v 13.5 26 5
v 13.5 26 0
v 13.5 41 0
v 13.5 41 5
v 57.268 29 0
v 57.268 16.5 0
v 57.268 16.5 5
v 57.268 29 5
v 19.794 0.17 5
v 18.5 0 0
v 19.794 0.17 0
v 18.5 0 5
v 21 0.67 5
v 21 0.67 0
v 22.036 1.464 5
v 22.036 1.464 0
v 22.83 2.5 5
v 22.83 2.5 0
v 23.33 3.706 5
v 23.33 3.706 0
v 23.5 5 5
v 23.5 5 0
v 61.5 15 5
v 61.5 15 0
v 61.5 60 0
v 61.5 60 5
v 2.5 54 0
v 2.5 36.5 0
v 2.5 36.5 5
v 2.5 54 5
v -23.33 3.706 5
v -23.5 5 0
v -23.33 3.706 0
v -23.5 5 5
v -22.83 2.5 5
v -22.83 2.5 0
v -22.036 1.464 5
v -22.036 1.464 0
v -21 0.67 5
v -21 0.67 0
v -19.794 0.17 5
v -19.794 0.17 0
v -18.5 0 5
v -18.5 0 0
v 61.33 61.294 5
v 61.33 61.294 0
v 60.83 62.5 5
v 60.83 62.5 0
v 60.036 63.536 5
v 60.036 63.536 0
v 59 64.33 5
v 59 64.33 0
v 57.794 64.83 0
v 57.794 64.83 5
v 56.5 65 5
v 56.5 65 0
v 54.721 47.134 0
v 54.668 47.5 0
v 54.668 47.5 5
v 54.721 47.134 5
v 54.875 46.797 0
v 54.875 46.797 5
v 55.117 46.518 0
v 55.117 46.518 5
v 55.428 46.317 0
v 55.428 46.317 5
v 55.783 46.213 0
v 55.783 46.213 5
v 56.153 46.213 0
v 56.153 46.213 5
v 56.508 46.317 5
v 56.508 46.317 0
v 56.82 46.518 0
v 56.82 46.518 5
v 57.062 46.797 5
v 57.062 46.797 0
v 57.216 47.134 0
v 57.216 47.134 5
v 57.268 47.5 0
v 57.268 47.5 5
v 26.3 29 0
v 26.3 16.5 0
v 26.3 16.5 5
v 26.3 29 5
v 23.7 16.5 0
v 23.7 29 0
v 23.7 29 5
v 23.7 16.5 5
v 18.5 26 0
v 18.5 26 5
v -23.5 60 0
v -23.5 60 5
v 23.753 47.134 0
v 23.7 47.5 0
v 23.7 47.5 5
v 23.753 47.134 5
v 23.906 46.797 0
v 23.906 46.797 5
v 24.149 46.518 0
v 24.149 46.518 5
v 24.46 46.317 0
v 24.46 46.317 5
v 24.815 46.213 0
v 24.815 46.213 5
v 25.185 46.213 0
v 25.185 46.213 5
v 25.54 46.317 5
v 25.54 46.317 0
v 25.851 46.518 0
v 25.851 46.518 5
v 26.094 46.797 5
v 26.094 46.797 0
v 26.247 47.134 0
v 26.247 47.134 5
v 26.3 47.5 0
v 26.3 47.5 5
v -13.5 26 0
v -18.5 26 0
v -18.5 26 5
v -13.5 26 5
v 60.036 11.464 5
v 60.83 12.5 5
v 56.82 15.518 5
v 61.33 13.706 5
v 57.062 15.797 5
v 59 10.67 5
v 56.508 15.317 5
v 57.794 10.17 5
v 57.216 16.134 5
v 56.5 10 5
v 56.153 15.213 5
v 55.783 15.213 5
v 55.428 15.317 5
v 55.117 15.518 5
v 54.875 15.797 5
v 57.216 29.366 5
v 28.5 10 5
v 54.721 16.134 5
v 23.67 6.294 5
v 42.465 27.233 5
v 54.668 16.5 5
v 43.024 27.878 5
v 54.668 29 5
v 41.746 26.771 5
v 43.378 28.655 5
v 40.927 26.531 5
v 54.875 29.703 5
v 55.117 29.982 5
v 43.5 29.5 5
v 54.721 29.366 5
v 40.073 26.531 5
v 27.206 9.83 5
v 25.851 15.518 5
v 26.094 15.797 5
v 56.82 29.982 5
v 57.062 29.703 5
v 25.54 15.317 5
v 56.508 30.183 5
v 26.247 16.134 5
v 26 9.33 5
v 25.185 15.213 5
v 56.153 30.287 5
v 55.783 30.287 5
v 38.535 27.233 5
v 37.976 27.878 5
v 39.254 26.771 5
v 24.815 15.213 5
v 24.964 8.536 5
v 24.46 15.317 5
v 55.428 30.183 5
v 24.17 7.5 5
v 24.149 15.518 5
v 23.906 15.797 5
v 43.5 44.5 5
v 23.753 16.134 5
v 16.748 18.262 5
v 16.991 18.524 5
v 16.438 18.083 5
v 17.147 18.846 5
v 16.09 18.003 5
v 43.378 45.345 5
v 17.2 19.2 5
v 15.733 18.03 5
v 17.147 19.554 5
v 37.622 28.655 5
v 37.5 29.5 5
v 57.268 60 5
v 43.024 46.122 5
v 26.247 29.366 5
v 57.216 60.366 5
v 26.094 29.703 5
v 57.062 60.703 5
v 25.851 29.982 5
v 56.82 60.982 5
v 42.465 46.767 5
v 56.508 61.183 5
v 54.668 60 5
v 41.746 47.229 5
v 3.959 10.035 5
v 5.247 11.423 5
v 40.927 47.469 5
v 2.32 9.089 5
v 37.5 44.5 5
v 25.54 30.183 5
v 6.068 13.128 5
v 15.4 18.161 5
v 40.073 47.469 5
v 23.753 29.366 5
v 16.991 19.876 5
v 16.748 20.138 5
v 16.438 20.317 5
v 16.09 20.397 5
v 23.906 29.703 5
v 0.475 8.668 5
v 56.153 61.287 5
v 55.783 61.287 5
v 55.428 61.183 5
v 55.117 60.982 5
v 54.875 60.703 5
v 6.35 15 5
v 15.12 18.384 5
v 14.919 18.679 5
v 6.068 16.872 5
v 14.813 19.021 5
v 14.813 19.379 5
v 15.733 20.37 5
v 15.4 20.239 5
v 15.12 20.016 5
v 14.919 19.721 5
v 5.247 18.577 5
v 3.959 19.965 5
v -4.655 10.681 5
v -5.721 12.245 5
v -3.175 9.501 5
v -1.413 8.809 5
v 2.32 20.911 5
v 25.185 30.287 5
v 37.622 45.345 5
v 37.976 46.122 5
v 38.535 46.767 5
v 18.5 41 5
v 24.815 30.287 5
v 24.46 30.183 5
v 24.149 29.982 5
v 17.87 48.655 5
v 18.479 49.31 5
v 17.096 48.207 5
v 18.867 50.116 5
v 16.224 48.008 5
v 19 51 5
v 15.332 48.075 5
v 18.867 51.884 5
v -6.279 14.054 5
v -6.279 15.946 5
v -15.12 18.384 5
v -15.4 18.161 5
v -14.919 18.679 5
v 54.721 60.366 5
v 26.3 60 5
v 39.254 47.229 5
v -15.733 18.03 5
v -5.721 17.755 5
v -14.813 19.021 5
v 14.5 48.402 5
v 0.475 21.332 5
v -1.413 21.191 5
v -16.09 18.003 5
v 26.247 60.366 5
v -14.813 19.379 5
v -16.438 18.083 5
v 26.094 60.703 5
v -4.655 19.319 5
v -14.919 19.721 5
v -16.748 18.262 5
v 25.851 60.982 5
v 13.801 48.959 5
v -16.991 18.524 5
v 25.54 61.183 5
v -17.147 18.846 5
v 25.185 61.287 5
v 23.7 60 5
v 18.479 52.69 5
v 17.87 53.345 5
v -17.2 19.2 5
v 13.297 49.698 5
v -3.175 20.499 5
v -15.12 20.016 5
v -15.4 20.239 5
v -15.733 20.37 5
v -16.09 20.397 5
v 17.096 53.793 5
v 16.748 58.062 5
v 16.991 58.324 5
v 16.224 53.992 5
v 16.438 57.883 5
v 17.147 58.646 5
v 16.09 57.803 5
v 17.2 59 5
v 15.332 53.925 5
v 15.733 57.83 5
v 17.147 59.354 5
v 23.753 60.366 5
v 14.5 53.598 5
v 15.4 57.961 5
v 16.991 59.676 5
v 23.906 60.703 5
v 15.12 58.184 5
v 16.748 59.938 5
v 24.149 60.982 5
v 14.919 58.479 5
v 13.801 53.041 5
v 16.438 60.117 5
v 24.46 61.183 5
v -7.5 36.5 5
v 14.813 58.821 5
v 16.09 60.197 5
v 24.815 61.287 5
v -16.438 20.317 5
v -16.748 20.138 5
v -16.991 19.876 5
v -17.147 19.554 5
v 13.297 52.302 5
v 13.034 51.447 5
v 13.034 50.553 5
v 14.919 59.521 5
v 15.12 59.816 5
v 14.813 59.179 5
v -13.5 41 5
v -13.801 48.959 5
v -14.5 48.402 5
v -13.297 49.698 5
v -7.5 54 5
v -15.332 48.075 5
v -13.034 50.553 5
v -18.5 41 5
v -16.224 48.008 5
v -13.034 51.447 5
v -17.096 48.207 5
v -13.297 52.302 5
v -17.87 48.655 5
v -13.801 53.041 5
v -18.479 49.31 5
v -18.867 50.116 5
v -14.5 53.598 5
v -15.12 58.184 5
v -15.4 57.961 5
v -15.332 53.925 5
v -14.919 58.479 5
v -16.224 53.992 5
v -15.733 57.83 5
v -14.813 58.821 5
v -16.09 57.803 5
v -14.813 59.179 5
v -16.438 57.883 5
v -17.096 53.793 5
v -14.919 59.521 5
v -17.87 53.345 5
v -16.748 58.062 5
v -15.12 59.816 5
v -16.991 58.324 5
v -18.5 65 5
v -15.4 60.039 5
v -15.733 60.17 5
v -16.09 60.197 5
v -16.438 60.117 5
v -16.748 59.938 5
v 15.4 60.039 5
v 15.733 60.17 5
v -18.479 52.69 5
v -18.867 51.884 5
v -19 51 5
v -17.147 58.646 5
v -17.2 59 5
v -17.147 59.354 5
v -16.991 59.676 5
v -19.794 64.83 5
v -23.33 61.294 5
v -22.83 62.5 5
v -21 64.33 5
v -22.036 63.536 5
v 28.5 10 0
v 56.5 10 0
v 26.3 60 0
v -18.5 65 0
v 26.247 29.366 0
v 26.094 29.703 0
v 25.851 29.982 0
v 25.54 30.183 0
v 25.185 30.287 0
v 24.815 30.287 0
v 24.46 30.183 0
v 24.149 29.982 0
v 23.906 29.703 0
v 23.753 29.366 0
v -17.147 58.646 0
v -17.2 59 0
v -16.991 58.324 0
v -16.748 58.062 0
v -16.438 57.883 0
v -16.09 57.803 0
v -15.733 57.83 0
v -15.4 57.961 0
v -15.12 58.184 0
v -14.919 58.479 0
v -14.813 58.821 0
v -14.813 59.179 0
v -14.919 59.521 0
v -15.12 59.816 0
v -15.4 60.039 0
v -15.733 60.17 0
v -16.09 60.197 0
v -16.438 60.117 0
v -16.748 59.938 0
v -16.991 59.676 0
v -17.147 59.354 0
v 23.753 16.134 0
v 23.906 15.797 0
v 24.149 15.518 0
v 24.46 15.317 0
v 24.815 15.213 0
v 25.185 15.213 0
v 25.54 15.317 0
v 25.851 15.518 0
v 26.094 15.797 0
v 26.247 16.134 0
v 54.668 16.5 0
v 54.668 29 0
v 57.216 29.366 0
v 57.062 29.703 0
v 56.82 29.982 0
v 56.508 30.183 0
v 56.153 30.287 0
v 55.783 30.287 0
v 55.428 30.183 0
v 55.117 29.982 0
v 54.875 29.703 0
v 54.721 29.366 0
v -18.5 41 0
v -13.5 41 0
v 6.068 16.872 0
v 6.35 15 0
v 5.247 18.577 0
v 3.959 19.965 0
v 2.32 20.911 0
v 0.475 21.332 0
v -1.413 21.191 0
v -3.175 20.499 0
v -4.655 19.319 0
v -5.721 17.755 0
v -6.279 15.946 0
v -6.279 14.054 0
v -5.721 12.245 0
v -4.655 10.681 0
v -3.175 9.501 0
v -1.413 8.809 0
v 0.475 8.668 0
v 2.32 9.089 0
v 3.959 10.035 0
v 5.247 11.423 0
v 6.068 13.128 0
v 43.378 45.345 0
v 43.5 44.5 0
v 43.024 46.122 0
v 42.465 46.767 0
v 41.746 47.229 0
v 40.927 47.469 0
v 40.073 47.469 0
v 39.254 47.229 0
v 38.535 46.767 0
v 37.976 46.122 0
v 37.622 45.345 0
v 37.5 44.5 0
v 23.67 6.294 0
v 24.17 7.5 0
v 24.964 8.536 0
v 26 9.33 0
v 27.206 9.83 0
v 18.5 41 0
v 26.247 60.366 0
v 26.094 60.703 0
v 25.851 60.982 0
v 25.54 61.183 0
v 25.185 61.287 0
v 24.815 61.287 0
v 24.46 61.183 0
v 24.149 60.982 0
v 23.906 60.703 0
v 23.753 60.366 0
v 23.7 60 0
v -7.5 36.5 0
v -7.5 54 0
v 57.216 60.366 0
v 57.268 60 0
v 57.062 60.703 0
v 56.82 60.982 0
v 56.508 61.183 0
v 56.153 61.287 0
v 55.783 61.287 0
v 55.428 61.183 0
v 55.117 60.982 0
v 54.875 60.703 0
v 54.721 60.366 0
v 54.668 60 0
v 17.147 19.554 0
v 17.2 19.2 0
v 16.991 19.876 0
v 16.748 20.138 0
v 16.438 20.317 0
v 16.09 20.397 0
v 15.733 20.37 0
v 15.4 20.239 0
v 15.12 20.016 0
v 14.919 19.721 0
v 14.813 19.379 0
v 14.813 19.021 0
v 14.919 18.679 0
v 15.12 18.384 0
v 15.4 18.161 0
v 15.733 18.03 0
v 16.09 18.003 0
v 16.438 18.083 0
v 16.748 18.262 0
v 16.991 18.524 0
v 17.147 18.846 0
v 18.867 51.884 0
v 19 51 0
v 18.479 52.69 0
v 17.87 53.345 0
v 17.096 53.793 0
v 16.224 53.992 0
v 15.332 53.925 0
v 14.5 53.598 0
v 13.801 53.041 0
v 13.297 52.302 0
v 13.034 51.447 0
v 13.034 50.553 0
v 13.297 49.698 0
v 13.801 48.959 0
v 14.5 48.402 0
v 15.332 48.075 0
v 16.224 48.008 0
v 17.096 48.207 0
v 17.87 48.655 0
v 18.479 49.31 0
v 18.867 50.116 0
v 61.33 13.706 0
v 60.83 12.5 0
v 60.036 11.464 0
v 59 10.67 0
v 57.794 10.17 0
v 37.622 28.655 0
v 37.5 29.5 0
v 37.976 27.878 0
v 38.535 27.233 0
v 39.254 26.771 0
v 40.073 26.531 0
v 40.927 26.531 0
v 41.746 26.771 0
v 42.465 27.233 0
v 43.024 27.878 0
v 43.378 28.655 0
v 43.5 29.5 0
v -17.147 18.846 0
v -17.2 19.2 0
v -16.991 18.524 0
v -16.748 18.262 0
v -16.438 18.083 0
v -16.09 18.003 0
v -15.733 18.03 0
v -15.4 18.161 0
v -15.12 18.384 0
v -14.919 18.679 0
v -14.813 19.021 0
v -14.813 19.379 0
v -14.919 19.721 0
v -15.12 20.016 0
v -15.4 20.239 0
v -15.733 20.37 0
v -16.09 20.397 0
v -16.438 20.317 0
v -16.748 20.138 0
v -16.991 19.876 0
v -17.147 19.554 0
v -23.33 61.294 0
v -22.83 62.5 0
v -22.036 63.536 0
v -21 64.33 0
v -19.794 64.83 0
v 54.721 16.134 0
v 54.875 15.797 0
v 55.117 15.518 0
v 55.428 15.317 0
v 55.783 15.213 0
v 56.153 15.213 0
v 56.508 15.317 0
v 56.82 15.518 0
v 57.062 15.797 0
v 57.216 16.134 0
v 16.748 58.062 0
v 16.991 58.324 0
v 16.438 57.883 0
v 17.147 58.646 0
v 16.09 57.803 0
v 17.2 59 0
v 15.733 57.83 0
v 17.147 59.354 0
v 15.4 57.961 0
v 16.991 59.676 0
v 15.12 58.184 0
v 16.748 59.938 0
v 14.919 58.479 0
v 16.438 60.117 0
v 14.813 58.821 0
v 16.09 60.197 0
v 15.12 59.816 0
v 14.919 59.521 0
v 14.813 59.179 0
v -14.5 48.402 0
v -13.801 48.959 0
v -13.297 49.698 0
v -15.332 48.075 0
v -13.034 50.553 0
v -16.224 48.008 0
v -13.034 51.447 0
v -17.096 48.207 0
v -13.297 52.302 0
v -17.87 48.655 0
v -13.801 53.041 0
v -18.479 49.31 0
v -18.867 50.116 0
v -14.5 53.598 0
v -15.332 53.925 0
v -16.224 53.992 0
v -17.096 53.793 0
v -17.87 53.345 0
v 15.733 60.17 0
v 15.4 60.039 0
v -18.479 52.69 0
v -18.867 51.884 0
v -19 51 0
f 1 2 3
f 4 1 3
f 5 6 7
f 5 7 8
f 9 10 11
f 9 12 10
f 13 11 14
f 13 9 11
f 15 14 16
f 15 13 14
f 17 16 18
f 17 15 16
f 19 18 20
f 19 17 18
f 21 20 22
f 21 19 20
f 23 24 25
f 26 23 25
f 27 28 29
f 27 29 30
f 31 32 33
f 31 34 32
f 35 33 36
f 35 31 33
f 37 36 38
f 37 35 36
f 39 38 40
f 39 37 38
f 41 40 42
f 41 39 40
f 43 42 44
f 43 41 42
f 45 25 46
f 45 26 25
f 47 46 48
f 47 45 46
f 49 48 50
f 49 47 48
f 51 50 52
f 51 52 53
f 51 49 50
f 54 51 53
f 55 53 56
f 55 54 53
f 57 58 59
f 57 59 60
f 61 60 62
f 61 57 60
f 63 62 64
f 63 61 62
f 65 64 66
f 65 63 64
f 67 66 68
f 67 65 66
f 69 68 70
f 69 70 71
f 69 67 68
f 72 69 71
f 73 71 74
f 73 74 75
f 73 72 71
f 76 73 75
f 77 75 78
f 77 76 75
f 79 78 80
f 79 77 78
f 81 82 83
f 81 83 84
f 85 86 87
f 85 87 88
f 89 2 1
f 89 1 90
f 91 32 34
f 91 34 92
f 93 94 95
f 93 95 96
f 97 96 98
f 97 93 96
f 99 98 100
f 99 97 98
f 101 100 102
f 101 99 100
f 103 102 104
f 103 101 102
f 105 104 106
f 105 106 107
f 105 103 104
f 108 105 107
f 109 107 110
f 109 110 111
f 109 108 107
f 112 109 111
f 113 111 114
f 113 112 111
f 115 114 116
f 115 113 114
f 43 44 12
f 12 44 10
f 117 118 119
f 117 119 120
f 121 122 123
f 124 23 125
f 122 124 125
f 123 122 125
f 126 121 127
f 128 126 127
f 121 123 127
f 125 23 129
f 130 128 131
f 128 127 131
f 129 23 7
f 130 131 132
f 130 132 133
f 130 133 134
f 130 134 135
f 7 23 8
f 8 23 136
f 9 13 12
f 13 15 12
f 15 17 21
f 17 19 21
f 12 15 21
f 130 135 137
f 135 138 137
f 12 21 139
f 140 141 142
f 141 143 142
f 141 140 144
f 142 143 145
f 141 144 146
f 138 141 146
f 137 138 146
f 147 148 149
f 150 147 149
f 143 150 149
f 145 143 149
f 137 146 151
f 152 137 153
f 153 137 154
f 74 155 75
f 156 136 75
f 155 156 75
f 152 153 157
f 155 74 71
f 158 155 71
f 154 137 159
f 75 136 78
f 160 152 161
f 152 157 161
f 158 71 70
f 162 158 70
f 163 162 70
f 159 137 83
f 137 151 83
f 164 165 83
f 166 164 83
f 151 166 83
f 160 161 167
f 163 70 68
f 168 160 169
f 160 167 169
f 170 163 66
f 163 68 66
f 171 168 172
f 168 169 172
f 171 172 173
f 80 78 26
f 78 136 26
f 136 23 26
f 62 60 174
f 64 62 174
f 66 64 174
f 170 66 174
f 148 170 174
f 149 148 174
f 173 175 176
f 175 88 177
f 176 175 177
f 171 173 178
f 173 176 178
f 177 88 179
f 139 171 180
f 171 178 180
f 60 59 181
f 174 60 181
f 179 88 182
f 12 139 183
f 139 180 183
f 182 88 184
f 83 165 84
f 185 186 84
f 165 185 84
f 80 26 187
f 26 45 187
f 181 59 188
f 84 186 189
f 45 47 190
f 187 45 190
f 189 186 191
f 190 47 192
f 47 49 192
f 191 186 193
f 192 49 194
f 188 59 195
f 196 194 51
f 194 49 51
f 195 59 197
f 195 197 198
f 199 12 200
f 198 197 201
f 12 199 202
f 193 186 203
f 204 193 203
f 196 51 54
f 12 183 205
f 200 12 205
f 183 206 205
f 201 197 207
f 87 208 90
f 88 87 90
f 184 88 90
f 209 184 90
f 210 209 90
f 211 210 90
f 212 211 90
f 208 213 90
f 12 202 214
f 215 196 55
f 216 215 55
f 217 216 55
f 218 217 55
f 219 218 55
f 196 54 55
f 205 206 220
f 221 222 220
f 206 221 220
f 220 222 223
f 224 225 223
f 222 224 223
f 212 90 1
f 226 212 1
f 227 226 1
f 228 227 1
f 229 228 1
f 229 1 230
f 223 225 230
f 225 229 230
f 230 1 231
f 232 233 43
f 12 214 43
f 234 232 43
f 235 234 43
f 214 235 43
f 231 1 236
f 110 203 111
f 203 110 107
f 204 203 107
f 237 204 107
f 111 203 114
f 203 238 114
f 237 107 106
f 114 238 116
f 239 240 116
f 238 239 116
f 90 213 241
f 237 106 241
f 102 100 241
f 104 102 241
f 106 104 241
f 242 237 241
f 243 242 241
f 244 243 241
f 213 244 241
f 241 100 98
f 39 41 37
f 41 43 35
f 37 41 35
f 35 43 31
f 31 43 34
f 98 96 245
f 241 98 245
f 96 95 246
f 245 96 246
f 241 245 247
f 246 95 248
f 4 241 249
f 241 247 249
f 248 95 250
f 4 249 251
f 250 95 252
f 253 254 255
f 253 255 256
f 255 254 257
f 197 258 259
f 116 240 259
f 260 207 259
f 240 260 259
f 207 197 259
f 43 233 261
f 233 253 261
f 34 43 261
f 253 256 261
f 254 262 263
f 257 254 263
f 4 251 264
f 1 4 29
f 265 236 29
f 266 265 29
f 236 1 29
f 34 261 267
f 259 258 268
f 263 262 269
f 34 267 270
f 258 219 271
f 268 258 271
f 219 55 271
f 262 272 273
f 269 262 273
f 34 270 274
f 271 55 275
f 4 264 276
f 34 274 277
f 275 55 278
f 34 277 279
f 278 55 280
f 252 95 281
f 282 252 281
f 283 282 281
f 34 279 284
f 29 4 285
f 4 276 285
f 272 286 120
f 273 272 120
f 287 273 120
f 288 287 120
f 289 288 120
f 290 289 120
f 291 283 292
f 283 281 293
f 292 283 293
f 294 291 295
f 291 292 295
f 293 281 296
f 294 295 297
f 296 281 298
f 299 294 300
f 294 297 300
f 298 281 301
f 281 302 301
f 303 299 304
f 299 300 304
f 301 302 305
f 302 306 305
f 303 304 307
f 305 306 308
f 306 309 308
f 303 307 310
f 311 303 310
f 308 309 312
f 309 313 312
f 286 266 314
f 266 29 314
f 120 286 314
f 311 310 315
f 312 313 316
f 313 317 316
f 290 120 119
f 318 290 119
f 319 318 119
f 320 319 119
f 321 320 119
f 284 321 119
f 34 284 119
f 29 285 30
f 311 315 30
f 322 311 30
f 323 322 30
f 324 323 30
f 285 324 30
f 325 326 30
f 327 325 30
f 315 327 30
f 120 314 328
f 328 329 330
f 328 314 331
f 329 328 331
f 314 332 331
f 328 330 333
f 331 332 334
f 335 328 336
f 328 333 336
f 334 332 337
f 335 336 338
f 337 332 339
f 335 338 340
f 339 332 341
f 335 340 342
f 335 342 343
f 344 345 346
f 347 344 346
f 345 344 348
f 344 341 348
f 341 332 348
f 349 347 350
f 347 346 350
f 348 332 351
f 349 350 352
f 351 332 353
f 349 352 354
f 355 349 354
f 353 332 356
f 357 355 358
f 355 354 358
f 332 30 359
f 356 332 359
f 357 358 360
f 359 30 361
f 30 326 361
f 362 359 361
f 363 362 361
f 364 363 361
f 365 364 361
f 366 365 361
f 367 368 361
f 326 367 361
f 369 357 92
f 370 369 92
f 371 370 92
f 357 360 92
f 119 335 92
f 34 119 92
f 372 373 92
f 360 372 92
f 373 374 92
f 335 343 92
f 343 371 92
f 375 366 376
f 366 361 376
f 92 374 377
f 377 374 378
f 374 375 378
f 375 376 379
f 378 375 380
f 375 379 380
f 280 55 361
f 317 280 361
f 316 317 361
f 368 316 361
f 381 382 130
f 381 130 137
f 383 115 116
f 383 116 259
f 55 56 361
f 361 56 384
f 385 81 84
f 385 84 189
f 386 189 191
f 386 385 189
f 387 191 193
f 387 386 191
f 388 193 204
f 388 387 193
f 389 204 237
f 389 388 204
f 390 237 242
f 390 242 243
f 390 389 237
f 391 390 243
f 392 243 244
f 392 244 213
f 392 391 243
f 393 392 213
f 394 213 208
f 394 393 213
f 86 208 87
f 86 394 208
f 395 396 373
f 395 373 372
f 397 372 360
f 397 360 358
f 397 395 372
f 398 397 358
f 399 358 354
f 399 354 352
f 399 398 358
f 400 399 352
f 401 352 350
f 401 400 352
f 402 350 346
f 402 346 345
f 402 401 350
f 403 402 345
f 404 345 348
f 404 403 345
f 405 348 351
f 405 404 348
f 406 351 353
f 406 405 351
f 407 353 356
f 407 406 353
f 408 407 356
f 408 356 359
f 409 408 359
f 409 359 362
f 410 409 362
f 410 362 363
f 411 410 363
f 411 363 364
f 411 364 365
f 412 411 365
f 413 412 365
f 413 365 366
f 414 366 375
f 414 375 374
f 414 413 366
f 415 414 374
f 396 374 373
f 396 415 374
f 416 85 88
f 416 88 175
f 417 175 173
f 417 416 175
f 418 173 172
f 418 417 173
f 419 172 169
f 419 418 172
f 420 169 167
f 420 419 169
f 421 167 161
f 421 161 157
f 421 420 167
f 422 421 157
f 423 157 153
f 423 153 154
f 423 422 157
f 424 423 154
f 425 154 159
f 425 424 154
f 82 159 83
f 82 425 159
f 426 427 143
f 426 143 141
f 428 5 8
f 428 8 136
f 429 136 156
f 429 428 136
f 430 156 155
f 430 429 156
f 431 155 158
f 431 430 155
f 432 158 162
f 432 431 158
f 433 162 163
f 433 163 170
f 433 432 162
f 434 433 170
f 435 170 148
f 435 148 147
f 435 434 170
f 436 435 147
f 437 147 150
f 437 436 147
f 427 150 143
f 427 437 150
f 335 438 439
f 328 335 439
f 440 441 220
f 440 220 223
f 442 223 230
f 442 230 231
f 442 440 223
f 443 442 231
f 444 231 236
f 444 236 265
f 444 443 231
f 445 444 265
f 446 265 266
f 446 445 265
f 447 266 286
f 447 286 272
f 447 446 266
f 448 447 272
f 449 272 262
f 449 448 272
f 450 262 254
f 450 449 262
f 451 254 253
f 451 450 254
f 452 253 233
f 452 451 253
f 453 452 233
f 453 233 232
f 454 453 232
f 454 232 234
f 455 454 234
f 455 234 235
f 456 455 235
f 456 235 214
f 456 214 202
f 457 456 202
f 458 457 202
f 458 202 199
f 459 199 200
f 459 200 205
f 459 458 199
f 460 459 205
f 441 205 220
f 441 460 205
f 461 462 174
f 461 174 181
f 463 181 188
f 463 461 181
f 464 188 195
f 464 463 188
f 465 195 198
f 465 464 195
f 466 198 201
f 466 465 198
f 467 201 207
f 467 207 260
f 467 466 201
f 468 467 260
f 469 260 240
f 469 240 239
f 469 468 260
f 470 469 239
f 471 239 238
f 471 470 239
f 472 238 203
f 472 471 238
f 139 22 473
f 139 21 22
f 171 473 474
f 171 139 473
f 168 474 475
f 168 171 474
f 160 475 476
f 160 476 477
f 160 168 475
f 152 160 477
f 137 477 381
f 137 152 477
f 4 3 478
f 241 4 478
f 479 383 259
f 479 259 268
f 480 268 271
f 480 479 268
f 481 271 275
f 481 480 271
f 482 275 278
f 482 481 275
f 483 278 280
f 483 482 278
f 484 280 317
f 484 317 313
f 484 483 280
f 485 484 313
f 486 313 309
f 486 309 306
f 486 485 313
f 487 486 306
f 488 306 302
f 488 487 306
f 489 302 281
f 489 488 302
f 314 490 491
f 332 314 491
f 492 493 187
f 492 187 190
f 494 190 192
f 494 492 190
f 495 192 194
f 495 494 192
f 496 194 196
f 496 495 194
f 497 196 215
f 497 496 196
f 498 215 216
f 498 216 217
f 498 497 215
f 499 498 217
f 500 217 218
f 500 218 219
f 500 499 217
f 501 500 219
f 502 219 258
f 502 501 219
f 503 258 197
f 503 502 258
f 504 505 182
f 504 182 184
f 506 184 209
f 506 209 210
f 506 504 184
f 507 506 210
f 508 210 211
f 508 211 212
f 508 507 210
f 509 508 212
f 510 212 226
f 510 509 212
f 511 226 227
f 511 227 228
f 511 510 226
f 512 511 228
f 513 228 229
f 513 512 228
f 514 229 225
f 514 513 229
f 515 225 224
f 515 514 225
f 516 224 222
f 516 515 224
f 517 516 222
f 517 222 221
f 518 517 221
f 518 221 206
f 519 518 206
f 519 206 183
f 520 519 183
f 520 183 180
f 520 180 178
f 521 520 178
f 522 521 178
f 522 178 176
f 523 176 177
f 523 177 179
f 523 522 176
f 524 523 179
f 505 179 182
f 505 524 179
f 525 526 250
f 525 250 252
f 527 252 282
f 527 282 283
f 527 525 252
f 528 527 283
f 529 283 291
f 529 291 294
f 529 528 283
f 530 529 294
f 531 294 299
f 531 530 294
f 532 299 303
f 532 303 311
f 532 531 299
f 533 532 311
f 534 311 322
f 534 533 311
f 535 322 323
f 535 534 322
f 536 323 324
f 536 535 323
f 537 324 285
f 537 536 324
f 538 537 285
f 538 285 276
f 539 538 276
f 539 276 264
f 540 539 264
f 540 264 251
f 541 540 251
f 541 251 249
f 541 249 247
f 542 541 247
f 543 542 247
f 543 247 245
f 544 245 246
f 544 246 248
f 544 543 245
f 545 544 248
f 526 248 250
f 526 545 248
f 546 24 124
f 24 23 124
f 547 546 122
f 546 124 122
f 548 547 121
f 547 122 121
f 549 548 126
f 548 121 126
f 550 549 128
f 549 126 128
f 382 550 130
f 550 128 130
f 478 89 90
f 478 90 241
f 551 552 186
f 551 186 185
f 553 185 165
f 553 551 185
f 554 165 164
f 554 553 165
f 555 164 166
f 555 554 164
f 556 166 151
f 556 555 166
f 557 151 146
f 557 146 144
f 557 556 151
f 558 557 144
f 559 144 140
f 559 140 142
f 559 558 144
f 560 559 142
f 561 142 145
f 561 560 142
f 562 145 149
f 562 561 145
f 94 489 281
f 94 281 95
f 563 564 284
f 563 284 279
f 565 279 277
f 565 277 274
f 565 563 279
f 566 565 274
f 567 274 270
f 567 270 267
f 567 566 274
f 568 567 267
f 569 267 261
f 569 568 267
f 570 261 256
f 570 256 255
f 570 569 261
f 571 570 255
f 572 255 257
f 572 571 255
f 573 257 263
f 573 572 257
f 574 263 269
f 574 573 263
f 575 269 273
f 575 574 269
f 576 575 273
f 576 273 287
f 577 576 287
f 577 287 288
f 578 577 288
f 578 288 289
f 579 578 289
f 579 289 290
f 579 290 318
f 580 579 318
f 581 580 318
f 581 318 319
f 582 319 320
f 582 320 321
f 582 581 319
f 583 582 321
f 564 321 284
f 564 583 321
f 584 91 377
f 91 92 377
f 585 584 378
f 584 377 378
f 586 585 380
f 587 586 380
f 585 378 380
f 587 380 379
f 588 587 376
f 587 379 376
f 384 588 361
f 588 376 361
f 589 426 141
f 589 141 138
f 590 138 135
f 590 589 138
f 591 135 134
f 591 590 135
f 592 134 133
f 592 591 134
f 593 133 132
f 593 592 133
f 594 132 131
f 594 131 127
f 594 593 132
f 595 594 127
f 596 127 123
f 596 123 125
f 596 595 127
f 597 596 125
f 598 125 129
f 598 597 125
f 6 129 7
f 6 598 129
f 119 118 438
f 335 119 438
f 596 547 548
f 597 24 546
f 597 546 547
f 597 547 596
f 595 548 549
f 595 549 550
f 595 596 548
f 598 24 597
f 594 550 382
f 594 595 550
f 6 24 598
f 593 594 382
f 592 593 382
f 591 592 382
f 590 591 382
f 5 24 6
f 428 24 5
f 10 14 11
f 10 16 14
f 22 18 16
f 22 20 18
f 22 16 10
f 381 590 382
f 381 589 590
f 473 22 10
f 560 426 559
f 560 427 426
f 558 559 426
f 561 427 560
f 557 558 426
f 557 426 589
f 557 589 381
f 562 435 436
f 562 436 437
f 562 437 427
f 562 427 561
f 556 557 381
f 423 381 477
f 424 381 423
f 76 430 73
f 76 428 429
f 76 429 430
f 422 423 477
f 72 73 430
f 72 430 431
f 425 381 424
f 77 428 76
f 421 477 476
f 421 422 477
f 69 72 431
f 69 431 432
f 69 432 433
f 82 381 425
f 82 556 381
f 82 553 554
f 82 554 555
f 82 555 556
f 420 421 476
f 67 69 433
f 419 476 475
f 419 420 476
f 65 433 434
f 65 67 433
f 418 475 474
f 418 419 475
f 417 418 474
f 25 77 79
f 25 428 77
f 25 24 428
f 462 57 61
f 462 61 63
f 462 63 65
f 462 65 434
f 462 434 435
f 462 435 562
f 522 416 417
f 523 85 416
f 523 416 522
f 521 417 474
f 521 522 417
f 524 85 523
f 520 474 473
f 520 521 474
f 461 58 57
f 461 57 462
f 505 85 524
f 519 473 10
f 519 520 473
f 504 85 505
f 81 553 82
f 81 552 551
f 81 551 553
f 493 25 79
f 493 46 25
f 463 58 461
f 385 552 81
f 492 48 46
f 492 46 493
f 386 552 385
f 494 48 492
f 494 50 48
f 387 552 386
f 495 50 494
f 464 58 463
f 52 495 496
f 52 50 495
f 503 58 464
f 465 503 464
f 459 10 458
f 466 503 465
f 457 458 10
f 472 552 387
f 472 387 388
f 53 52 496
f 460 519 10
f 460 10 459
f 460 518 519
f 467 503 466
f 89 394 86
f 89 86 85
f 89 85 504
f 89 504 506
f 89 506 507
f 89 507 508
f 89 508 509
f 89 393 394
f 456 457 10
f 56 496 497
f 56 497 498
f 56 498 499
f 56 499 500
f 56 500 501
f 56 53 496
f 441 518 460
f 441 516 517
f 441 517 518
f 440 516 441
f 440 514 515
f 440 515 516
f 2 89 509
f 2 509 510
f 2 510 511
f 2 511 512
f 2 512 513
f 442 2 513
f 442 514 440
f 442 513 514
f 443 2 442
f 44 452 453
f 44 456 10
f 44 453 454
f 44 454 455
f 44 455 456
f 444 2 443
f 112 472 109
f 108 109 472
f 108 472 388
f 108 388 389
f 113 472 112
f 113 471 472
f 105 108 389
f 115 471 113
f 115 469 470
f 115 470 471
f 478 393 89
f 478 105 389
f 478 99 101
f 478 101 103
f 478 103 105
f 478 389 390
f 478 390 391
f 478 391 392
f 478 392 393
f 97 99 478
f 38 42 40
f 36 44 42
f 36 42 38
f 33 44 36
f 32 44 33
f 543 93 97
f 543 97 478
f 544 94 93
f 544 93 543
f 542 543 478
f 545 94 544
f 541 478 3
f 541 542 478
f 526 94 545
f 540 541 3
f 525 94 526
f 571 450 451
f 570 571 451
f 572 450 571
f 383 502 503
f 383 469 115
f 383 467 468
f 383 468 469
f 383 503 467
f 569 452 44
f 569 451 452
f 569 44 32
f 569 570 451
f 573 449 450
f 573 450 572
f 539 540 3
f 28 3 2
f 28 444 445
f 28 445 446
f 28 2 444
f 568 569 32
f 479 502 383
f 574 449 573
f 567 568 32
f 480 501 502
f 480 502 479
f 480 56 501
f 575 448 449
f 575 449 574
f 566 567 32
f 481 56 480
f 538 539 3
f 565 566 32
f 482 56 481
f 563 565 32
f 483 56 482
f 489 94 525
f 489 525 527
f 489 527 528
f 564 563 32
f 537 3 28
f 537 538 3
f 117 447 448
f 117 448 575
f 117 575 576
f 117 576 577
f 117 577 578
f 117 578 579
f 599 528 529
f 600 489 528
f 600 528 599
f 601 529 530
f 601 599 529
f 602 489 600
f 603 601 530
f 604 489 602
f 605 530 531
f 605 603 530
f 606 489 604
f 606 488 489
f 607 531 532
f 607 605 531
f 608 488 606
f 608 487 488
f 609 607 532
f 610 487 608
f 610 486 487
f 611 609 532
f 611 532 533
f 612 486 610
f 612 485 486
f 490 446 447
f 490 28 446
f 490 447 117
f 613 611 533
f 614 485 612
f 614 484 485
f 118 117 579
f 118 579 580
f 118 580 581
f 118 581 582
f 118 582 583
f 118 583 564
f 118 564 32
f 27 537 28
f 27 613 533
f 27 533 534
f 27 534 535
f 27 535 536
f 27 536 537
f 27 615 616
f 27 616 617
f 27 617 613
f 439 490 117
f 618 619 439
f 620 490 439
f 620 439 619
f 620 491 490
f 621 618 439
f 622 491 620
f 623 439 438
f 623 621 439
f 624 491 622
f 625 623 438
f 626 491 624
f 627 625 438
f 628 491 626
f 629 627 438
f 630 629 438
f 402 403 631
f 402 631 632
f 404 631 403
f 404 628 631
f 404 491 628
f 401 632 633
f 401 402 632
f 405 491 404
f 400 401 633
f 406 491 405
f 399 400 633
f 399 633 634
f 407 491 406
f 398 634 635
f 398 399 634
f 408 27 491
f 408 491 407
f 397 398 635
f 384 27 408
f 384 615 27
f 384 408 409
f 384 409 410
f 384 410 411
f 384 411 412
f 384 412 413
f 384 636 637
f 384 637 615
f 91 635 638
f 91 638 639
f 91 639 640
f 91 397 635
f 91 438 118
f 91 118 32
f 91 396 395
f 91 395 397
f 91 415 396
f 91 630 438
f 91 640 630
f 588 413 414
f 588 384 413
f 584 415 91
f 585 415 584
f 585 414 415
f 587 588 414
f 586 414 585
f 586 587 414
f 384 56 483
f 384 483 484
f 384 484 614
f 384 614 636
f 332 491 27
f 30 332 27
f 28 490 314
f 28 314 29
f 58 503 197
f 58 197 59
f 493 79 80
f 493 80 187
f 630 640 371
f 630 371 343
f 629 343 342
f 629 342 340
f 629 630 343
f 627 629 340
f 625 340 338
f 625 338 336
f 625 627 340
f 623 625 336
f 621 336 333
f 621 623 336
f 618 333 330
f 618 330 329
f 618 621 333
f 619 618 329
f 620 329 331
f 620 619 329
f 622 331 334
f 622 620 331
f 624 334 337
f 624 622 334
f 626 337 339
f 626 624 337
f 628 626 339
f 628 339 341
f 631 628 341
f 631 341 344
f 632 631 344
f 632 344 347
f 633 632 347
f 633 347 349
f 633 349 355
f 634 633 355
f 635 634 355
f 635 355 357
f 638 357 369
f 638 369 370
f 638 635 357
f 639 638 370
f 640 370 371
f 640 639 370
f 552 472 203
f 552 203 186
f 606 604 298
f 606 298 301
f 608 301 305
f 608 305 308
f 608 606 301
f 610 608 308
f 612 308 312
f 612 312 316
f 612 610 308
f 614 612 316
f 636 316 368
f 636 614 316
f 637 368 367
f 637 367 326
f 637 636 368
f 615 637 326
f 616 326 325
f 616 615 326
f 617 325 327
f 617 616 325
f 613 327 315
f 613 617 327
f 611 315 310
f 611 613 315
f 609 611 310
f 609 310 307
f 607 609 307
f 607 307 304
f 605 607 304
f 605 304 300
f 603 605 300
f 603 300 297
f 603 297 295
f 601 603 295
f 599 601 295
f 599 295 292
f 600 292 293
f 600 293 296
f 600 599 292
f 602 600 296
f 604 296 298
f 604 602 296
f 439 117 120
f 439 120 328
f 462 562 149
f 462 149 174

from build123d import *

# Parameters (mm, degrees)
SKETCH1_R           = 3
SKETCH1_R_2         = 1.2
SKETCH1_R_3         = 6.35
SKETCH1_W           = 5
SKETCH1_H           = 15
SKETCH1_W_2         = 10
SKETCH1_H_2         = 17.5
BOSS_EXTRUDE1_DEPTH = 5
SKETCH2_W           = 38
SKETCH2_H           = 55
BOSS_EXTRUDE2_DEPTH = 5
FILLET1_R           = 5


with BuildPart() as part:
    # Sketch1 → Boss-Extrude1 (new body)
    with BuildSketch(Plane.XY):
        Polygon((-23.5, 65), (23.5, 65), (23.5, 0), (0, 0), (-23.5, 0), align=None)
        with Locations((16, 51)):
            Circle(SKETCH1_R, mode=Mode.SUBTRACT)
        with Locations((16, 19.2)):
            Circle(SKETCH1_R_2, mode=Mode.SUBTRACT)
        with Locations((16, 59)):
            Circle(SKETCH1_R_2, mode=Mode.SUBTRACT)
        with Locations(Location((-16, 59, 0), (0, 0, 180))):
            Circle(SKETCH1_R_2, mode=Mode.SUBTRACT)
        with Locations(Location((-16, 19.2, 0), (0, 0, 180))):
            Circle(SKETCH1_R_2, mode=Mode.SUBTRACT)
        with Locations(Location((-16, 51, 0), (0, 0, 180))):
            Circle(SKETCH1_R, mode=Mode.SUBTRACT)
        with Locations((0, 15)):
            Circle(SKETCH1_R_3, mode=Mode.SUBTRACT)
        with Locations((16, 33.5)):
            Rectangle(SKETCH1_W, SKETCH1_H, mode=Mode.SUBTRACT)
        with Locations((-2.5, 45.25)):
            Rectangle(SKETCH1_W_2, SKETCH1_H_2, mode=Mode.SUBTRACT)
        with Locations((-16, 33.5)):
            Rectangle(SKETCH1_W, SKETCH1_H, mode=Mode.SUBTRACT)
    extrude(amount=BOSS_EXTRUDE1_DEPTH)

    # Sketch2 → Boss-Extrude2 (add)
    with BuildSketch(Plane(origin=(0, 0, 0), x_dir=(-1, 0, 0), z_dir=(0, 0, -1))):
        with Locations((-42.5, 37.5)):
            Rectangle(SKETCH2_W, SKETCH2_H)
        with BuildLine():
            Line((-37.5, 44.5), (-37.5, 29.5))
            ThreePointArc((-37.5, 29.5), (-40.5, 26.5), (-43.5, 29.5))
            Line((-43.5, 29.5), (-43.5, 44.5))
            ThreePointArc((-43.5, 44.5), (-40.5, 47.5), (-37.5, 44.5))
        make_face(mode=Mode.SUBTRACT)
        with BuildLine():
            Line((-23.7, 60), (-23.7, 47.5))
            ThreePointArc((-23.7, 47.5), (-25, 46.2), (-26.3, 47.5))
            Line((-26.3, 47.5), (-26.3, 60))
            ThreePointArc((-26.3, 60), (-25, 61.3), (-23.7, 60))
        make_face(mode=Mode.SUBTRACT)
        with BuildLine():
            Line((-54.668271165, 60), (-54.668271165, 47.5))
            ThreePointArc((-54.668271165, 47.5), (-55.968271165, 46.2), (-57.268271165, 47.5))
            Line((-57.268271165, 47.5), (-57.268271165, 60))
            ThreePointArc((-57.268271165, 60), (-55.968271165, 61.3), (-54.668271165, 60))
        make_face(mode=Mode.SUBTRACT)
        with BuildLine():
            Line((-23.7, 29), (-23.7, 16.5))
            ThreePointArc((-23.7, 16.5), (-25, 15.2), (-26.3, 16.5))
            Line((-26.3, 16.5), (-26.3, 29))
            ThreePointArc((-26.3, 29), (-25, 30.3), (-23.7, 29))
        make_face(mode=Mode.SUBTRACT)
        with BuildLine():
            Line((-54.668271165, 29), (-54.668271165, 16.5))
            ThreePointArc((-54.668271165, 16.5), (-55.968271165, 15.2), (-57.268271165, 16.5))
            Line((-57.268271165, 16.5), (-57.268271165, 29))
            ThreePointArc((-57.268271165, 29), (-55.968271165, 30.3), (-54.668271165, 29))
        make_face(mode=Mode.SUBTRACT)
    extrude(amount=-BOSS_EXTRUDE2_DEPTH)

    # Fillet1
    fillet1_edges = [part.edges().sort_by_distance(p)[0] for p in [
        (23.5, 0, 2.5),
        (-23.5, 0, 2.5),
        (-23.5, 65, 2.5),
        (23.5, 10, 2.5),
        (61.5, 10, 2.5),
        (61.5, 65, 2.5),
    ]]
    fillet(fillet1_edges, radius=FILLET1_R - 0.0001)  # a hair under: the kernel refuses the full size


solid = part.part
